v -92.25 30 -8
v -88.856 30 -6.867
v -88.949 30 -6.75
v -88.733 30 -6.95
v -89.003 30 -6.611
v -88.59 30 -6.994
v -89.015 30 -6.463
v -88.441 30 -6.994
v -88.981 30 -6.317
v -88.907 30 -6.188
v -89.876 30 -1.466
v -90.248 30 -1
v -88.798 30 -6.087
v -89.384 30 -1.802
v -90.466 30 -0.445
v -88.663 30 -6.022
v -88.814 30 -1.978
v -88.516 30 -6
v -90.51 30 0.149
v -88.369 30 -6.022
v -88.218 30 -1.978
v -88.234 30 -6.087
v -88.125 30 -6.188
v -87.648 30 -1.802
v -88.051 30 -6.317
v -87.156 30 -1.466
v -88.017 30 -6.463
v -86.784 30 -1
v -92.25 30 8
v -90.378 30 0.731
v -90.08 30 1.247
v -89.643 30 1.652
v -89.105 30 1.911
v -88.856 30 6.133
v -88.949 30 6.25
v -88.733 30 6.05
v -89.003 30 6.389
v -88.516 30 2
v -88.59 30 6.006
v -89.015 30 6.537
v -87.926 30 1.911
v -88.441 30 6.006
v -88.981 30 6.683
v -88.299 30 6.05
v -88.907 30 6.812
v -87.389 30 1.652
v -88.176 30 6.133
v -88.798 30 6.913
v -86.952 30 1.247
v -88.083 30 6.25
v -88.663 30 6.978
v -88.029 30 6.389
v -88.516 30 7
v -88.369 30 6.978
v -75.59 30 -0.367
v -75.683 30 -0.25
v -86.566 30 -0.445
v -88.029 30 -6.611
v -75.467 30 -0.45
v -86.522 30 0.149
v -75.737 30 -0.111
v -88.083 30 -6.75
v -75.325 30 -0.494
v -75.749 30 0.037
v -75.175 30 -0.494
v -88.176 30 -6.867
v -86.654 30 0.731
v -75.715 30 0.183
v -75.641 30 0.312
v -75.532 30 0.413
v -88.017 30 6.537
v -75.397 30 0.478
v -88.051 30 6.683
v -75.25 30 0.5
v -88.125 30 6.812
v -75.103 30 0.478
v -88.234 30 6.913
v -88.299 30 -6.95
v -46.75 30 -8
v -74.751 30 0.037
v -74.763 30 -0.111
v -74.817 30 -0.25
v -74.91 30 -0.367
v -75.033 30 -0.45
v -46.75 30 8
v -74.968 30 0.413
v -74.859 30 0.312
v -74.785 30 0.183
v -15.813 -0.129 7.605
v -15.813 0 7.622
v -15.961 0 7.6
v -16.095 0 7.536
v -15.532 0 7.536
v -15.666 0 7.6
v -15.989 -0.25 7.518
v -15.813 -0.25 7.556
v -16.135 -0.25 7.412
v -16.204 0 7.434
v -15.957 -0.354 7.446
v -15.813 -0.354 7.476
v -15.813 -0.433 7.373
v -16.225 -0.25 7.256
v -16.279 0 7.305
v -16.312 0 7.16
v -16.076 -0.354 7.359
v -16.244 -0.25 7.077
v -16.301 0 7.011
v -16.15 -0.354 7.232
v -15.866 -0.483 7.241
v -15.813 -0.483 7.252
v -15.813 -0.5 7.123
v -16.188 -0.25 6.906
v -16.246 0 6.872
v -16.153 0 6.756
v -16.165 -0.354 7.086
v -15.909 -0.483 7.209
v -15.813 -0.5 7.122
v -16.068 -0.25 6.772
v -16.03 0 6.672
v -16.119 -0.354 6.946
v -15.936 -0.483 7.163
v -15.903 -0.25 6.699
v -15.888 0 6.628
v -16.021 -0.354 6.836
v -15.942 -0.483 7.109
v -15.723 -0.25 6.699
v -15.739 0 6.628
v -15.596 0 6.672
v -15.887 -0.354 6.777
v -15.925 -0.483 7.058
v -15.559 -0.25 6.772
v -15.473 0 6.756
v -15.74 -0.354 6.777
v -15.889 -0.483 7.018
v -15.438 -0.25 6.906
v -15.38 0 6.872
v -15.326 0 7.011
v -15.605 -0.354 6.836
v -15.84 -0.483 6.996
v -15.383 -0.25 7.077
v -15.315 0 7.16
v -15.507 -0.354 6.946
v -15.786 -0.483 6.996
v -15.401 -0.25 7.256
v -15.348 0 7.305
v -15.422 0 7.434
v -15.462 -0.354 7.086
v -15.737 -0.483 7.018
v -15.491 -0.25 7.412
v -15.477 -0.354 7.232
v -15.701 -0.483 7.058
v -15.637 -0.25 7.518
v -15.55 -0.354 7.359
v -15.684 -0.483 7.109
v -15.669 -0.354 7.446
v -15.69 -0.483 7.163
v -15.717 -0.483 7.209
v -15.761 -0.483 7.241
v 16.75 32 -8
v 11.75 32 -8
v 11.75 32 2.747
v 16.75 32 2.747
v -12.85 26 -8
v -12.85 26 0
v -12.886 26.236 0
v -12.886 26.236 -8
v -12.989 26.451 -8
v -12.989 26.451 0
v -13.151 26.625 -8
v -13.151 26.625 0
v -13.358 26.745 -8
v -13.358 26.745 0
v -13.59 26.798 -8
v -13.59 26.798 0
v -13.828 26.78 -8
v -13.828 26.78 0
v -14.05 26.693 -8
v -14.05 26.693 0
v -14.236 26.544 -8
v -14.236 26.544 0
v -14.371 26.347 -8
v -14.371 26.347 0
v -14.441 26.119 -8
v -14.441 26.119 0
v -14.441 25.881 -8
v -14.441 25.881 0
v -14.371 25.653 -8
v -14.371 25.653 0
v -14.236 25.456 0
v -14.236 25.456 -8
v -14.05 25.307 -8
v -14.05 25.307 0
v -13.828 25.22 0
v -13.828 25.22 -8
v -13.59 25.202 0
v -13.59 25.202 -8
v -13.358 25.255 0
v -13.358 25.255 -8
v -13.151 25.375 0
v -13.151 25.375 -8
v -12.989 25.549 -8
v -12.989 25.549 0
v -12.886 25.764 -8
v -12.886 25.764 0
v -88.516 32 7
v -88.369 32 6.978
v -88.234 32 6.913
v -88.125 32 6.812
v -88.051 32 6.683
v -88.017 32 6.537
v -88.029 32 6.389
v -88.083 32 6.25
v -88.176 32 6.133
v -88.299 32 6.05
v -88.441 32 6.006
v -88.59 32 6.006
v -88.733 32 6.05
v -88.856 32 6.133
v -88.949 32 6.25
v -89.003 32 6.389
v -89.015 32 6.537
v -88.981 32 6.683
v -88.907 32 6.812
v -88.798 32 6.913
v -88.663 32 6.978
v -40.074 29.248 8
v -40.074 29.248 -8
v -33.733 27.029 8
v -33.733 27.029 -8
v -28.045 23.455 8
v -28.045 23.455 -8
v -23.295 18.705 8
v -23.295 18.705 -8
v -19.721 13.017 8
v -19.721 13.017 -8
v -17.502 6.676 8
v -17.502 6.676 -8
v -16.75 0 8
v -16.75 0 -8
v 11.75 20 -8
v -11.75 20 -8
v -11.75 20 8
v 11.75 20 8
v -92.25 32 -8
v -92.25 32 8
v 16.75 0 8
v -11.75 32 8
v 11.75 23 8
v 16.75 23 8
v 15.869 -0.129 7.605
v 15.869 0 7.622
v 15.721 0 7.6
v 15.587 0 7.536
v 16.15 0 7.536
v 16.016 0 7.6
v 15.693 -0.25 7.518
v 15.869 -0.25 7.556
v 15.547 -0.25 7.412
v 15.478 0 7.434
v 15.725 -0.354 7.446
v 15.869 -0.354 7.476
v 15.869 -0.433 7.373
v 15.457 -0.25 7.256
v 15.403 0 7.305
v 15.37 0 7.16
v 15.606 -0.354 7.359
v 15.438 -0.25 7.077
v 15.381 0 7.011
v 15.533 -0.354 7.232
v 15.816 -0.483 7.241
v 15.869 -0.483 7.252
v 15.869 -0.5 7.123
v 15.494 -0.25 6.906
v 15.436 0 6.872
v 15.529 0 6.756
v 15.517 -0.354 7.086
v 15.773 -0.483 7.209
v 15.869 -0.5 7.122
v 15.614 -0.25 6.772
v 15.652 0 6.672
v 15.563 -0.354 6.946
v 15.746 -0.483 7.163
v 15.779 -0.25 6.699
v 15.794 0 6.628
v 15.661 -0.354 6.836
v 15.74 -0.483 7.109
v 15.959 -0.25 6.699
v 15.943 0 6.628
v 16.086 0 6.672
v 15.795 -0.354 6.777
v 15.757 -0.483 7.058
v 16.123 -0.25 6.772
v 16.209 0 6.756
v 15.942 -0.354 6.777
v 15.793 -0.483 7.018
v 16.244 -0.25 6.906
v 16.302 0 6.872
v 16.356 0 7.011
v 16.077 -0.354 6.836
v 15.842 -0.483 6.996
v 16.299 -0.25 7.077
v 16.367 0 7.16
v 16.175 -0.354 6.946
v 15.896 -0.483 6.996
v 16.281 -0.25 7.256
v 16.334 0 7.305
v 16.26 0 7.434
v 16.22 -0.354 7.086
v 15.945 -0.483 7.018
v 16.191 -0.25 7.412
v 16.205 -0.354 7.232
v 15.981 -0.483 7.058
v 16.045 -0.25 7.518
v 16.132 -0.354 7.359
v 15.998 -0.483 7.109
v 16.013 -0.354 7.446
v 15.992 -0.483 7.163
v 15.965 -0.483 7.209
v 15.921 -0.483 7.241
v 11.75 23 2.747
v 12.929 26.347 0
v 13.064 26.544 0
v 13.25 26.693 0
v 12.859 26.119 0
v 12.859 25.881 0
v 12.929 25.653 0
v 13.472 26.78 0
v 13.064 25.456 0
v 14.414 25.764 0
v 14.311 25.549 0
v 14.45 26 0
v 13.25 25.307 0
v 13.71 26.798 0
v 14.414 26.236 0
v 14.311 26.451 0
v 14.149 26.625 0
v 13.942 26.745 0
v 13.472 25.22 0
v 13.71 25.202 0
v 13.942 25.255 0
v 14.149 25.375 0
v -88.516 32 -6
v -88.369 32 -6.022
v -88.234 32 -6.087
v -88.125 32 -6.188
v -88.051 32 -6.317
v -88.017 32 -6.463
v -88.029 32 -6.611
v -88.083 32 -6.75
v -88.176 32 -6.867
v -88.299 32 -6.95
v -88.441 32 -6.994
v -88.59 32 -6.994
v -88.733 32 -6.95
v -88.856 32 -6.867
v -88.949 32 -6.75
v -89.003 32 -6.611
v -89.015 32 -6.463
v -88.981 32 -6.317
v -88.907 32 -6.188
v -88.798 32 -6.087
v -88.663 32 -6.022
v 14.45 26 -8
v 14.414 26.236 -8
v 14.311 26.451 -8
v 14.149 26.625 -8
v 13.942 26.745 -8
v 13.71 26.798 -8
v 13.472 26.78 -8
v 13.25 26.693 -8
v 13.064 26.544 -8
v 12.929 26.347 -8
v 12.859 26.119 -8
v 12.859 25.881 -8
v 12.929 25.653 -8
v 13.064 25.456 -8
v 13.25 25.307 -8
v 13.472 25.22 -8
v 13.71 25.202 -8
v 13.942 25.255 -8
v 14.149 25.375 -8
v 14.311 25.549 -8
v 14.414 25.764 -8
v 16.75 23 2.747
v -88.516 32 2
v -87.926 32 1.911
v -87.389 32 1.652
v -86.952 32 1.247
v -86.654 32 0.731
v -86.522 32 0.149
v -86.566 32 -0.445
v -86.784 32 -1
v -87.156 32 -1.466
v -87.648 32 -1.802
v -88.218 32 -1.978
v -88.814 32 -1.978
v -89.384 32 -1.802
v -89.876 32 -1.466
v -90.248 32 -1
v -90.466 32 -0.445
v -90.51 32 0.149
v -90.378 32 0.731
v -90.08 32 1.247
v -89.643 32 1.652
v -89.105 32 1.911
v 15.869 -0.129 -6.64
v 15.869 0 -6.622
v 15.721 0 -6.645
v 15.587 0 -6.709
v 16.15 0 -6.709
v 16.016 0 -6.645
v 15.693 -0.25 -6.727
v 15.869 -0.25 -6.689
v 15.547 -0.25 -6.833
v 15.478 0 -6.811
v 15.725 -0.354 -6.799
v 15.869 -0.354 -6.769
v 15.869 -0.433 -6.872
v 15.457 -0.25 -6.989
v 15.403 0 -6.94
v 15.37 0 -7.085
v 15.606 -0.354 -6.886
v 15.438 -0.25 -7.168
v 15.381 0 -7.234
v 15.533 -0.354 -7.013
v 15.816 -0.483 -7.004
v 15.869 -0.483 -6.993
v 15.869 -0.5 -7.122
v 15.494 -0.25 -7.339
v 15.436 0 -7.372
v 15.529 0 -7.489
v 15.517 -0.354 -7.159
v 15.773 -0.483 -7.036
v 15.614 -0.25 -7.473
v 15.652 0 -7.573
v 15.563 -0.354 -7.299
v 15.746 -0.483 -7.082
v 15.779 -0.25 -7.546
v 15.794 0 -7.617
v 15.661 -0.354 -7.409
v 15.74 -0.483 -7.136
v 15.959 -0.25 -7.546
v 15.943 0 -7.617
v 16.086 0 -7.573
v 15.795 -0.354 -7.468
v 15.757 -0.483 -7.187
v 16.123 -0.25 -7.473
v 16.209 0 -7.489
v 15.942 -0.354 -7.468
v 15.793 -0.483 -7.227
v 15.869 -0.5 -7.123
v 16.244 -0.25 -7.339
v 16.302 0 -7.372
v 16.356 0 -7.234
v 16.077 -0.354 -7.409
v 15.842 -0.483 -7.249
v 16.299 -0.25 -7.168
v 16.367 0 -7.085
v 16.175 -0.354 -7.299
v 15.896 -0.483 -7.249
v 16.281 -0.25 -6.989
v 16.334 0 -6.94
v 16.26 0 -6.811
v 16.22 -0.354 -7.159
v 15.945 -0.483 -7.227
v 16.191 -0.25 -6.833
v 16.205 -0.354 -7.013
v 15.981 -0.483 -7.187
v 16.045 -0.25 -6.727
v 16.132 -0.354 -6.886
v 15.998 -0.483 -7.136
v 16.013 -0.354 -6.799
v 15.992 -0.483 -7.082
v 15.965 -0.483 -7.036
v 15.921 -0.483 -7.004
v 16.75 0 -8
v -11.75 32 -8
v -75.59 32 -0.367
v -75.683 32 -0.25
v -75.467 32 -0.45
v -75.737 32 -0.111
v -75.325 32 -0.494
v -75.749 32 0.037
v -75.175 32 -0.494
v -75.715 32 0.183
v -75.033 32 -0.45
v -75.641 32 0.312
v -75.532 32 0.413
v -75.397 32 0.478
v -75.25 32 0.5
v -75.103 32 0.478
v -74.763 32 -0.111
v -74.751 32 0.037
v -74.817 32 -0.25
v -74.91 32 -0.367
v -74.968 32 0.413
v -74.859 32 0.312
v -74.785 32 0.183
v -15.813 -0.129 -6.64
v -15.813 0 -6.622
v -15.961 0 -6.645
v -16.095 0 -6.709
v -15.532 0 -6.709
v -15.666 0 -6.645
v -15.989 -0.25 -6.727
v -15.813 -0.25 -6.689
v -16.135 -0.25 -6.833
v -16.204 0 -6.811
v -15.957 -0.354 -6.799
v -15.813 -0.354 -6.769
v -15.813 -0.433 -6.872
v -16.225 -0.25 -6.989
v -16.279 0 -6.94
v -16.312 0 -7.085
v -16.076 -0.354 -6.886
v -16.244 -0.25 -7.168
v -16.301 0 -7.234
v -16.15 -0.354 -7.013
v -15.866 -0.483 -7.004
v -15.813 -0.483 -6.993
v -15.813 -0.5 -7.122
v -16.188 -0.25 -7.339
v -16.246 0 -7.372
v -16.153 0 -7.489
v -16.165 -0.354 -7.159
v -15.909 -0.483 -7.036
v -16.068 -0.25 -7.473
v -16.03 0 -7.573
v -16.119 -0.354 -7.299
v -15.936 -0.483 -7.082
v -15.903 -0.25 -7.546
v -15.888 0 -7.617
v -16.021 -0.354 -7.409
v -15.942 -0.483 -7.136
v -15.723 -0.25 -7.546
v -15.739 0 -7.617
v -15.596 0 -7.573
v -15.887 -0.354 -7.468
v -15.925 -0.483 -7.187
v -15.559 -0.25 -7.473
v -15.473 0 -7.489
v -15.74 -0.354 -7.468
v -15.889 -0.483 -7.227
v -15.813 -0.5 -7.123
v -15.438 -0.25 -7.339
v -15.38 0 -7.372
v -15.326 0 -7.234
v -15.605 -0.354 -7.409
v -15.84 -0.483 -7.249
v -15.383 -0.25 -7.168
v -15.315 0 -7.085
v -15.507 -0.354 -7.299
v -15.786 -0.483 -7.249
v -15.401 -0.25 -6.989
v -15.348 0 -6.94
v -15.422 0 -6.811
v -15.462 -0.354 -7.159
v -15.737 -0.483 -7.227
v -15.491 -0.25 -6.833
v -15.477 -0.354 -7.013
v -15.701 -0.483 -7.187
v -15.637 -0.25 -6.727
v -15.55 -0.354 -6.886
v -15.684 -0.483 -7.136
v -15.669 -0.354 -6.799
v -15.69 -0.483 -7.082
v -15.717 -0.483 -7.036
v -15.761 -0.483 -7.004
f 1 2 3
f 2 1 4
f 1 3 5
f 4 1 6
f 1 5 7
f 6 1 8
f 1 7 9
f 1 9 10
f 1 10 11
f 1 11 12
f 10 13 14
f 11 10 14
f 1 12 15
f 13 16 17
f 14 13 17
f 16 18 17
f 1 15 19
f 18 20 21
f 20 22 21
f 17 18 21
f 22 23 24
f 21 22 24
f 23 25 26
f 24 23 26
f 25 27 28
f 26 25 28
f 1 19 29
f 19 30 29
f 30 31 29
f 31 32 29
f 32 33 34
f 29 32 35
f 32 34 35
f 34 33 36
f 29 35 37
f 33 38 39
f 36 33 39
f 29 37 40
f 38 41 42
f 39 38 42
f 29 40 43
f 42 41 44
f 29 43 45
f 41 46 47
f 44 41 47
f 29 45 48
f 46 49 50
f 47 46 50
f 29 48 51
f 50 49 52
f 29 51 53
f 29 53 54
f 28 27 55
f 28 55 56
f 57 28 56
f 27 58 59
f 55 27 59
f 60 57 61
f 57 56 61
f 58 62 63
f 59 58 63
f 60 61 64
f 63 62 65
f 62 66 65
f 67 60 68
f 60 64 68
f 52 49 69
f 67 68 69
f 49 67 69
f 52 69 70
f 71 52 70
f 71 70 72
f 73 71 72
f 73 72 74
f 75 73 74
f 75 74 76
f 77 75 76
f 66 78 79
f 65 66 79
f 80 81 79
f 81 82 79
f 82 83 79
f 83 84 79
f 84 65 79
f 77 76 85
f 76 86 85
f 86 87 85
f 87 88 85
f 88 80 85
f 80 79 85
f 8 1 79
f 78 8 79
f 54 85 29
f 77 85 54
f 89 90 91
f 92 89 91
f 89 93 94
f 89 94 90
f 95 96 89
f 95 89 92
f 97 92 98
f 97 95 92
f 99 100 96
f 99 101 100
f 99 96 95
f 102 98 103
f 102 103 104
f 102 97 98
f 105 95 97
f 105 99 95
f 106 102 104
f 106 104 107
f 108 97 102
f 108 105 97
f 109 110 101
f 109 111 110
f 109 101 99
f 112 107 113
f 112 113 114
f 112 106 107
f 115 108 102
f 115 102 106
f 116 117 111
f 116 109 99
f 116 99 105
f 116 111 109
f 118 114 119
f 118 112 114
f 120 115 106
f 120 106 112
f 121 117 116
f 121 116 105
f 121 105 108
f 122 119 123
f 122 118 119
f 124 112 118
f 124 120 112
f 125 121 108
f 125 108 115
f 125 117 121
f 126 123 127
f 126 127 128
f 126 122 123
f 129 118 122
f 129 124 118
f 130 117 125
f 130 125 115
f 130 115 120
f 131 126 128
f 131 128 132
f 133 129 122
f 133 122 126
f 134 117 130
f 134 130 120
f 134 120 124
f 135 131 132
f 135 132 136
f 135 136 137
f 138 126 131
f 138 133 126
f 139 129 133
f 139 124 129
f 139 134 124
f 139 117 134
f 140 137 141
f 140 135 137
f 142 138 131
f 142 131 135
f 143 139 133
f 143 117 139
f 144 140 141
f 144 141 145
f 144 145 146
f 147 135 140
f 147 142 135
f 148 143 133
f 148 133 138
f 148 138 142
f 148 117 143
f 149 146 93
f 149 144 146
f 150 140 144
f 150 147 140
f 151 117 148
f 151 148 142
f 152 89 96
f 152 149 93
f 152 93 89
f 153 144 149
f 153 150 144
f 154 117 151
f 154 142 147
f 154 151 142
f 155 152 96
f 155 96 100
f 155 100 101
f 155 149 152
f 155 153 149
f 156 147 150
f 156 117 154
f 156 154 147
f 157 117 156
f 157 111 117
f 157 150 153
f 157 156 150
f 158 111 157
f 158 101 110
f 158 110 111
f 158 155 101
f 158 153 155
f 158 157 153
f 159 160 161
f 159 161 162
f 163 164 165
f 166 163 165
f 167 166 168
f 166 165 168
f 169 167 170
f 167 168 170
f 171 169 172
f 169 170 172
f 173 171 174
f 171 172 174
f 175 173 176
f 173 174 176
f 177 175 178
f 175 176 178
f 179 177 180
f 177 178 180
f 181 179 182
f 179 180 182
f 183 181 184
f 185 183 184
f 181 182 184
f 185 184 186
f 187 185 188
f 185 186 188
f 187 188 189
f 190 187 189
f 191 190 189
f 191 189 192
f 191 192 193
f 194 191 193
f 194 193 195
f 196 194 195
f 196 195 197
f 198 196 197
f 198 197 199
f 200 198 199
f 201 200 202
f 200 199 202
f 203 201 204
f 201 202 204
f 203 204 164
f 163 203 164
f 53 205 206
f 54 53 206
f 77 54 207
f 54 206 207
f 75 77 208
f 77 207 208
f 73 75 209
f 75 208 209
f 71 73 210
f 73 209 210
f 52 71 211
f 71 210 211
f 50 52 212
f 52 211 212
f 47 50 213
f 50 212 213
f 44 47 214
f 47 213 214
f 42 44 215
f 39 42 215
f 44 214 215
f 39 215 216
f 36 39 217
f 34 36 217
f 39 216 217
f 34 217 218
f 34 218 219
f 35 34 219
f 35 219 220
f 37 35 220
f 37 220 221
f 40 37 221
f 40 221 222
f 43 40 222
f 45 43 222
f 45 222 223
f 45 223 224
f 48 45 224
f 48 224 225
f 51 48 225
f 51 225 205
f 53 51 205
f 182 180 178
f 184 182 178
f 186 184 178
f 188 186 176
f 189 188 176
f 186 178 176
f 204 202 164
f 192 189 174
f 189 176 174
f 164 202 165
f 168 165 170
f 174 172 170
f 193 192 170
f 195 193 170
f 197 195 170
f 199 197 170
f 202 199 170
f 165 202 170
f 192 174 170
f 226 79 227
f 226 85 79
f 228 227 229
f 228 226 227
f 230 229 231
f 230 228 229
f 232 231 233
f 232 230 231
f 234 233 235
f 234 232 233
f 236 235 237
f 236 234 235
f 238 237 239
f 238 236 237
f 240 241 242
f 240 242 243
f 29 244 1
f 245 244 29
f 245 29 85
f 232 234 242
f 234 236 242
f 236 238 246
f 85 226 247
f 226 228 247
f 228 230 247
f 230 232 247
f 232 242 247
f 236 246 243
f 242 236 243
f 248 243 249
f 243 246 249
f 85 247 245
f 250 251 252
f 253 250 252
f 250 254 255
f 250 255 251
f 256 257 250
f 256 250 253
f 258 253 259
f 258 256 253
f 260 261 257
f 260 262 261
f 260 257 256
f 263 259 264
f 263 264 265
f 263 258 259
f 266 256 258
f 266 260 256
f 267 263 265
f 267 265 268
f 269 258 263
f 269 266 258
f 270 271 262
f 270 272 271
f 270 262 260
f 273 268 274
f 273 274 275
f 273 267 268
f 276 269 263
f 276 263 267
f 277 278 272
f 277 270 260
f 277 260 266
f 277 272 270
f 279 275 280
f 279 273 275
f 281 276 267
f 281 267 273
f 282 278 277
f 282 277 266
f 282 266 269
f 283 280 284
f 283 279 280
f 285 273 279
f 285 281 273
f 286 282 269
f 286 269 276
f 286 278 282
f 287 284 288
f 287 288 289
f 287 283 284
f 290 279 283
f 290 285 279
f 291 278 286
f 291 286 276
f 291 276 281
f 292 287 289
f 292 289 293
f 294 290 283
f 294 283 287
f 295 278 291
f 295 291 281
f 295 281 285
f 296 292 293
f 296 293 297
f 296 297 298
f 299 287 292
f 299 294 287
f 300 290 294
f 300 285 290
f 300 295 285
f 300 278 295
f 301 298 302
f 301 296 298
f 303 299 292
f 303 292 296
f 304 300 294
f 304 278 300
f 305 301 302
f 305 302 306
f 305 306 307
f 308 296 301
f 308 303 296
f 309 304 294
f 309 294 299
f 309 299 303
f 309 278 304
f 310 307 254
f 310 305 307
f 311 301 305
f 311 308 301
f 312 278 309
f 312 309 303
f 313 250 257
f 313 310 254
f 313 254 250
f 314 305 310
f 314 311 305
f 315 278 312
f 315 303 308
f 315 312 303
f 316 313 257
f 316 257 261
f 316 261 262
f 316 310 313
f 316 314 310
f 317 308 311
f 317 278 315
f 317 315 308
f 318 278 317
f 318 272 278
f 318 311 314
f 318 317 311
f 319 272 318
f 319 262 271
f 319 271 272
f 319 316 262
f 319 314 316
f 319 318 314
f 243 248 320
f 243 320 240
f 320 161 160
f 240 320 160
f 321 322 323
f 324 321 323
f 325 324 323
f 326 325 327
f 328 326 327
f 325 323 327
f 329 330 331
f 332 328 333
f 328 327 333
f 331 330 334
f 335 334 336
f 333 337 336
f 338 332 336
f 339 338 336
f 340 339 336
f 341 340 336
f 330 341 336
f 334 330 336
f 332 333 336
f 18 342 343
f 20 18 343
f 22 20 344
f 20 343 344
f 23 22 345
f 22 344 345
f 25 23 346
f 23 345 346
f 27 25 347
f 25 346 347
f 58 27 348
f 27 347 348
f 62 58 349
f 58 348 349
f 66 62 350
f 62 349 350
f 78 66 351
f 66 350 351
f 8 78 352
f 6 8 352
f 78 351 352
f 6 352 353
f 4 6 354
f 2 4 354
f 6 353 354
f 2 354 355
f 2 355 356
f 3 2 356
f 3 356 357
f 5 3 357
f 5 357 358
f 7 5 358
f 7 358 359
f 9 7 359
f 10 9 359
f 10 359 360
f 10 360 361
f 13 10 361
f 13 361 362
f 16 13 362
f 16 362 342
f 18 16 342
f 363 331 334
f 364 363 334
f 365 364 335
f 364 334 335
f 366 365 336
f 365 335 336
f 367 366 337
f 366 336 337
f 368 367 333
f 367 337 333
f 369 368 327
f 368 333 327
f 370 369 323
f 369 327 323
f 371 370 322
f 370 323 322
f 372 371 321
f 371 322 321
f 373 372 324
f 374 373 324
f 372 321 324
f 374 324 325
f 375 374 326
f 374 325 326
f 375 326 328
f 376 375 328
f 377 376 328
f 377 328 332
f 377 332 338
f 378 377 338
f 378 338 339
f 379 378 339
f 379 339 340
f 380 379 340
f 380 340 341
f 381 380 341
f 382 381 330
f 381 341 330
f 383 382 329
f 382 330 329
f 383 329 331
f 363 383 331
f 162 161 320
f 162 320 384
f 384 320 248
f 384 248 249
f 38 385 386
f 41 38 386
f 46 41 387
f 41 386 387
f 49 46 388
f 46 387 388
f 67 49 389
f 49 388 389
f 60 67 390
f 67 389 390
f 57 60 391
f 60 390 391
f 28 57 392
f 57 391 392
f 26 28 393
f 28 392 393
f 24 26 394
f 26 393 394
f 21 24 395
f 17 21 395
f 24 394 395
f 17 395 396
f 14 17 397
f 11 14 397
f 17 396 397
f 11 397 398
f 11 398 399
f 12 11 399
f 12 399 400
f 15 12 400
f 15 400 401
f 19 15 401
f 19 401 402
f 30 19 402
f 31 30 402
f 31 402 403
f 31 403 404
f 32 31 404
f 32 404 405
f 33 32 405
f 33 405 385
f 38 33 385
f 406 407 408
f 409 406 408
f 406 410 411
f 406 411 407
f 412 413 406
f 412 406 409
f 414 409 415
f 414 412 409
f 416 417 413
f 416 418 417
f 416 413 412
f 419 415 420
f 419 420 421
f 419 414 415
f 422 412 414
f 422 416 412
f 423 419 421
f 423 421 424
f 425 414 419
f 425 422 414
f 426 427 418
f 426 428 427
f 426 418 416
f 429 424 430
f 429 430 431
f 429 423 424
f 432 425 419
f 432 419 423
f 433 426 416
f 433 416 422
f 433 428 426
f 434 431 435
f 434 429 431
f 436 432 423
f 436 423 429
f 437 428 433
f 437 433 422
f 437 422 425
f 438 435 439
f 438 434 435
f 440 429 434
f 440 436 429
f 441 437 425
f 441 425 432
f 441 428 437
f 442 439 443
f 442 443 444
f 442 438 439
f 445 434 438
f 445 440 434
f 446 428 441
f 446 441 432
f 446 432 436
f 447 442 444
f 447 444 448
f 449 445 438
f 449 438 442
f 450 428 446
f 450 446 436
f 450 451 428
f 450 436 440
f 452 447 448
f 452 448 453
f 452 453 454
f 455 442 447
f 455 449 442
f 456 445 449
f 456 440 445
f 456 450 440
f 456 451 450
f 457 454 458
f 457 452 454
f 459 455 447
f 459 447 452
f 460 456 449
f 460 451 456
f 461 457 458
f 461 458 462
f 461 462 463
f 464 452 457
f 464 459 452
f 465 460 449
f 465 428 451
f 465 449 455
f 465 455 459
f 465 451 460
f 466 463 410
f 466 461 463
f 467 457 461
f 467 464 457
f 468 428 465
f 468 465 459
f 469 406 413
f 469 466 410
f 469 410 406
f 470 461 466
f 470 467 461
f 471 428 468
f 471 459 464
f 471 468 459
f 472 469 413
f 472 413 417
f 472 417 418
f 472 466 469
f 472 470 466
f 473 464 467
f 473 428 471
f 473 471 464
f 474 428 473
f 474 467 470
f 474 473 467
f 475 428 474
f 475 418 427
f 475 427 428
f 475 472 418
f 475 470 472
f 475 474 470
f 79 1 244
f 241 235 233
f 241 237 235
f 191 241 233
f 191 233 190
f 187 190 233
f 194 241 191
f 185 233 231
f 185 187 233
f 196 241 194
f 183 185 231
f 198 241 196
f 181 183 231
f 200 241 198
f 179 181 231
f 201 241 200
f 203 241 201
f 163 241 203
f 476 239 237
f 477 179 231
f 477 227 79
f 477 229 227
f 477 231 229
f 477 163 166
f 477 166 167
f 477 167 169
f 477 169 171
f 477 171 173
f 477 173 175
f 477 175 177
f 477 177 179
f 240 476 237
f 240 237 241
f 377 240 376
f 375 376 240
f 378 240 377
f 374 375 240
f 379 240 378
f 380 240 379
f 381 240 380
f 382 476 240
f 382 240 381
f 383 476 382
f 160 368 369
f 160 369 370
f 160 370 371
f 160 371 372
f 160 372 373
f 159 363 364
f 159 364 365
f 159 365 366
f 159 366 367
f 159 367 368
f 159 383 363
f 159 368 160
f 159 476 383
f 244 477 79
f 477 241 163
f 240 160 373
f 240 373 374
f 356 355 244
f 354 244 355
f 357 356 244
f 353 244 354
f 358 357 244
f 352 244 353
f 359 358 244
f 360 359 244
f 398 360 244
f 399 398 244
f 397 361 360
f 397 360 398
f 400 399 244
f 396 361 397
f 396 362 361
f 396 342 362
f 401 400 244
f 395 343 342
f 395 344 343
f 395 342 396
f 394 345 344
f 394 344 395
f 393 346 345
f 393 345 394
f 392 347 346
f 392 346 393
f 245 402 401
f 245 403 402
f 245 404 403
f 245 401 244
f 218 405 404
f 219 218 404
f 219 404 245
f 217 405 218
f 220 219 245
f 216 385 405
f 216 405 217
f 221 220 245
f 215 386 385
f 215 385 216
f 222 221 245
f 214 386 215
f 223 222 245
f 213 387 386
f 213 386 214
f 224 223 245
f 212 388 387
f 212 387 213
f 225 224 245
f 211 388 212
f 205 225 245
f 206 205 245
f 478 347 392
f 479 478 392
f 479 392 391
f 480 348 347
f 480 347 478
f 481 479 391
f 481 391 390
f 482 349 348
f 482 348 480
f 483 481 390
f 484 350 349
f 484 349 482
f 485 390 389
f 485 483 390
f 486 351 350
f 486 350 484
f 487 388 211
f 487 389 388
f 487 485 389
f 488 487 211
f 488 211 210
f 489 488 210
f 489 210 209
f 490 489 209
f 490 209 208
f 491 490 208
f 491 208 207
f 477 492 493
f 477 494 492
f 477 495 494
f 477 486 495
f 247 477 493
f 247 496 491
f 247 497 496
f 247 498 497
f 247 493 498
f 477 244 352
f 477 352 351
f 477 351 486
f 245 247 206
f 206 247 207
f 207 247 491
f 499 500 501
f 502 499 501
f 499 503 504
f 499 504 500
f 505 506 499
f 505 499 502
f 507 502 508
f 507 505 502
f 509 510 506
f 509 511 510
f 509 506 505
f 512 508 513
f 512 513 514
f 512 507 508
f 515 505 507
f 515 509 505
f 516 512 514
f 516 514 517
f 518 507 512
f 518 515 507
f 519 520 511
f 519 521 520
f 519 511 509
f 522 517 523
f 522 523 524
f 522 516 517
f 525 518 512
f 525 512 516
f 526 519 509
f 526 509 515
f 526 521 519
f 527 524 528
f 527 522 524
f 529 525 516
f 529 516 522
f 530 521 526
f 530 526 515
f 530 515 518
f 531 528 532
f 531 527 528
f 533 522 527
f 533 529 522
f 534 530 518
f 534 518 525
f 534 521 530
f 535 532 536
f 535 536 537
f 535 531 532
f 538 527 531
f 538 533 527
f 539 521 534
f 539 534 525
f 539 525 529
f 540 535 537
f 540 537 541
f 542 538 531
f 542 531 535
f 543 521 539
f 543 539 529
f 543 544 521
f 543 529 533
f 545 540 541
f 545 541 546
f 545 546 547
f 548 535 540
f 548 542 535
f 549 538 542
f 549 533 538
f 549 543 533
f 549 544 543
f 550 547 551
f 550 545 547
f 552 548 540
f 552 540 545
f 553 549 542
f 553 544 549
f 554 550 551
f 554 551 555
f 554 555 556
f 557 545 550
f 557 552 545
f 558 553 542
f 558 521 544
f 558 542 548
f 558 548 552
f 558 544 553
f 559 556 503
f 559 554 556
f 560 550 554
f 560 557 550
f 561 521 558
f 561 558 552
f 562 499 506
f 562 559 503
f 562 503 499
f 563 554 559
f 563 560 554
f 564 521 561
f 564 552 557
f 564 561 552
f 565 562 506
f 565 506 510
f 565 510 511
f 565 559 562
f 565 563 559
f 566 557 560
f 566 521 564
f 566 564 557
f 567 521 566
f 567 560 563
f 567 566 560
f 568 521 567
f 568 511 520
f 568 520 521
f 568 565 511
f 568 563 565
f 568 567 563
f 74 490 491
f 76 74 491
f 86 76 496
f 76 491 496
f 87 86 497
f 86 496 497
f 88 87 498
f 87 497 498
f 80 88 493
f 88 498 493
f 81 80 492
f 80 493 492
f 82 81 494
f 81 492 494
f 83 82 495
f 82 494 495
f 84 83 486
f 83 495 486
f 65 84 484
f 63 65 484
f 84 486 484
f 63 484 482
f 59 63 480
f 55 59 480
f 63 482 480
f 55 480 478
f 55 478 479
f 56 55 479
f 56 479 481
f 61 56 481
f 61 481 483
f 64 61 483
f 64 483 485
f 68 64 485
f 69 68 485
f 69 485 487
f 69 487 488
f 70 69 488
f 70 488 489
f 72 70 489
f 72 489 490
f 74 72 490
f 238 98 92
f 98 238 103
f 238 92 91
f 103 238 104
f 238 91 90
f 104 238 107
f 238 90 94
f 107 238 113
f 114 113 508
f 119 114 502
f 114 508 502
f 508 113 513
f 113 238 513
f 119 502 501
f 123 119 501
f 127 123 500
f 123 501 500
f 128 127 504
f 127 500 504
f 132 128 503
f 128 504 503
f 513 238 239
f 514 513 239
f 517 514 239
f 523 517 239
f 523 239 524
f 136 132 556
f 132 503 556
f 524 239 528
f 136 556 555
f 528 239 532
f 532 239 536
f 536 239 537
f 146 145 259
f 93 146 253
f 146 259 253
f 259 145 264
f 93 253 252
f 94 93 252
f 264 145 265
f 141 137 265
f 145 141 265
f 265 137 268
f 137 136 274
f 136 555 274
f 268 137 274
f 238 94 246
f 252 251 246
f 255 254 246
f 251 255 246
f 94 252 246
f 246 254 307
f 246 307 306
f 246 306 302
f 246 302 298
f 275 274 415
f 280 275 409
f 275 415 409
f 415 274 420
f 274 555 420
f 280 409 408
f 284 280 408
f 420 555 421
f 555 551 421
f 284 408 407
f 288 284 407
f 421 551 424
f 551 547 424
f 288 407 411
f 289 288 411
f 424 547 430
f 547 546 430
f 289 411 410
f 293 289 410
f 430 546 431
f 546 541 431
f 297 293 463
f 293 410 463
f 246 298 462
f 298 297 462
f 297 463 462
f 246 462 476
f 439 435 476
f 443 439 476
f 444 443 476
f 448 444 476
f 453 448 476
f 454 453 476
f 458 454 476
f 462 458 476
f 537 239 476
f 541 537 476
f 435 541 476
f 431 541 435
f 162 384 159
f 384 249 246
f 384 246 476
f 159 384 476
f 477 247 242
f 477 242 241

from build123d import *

# Parameters (mm, degrees)
SKETCH1_W           = 33.5
SKETCH1_H           = 16
BOSS_EXTRUDE1_DEPTH = 32
SKETCH2_W           = 23.5
SKETCH2_H           = 16
CUT_EXTRUDE1_DEPTH  = 12
SKETCH4_R           = 0.5
BOSS_EXTRUDE2_DEPTH = 0.5
FILLET1_R           = 0.5
SKETCH6_W           = 16
SKETCH6_H           = 2
BOSS_EXTRUDE3_DEPTH = 75.5
SKETCH7_W           = 5
SKETCH7_H           = 5.252635659
CUT_EXTRUDE2_DEPTH  = 9
SKETCH8_R           = 0.8
CUT_EXTRUDE3_DEPTH  = 8
SKETCH9_R           = 0.5
SKETCH9_R_2         = 2
CUT_EXTRUDE4_DEPTH  = 8
FILLET2_R           = 30


with BuildPart() as part:
    # Sketch1 → Boss-Extrude1 (new body)
    with BuildSketch(Plane(origin=(0, 0, 0), x_dir=(1, 0, 0), z_dir=(0, 1, 0))):
        Rectangle(SKETCH1_W, SKETCH1_H)
    extrude(amount=BOSS_EXTRUDE1_DEPTH)

    # Sketch2 → Cut-Extrude1 (cut)
    with BuildSketch(Plane(origin=(0, 32, 0), x_dir=(1, 0, 0), z_dir=(0, 1, 0))):
        Rectangle(SKETCH2_W, SKETCH2_H)
    extrude(amount=-CUT_EXTRUDE1_DEPTH, mode=Mode.SUBTRACT)

    # Sketch4 → Boss-Extrude2 (add)
    with BuildSketch(Plane(origin=(0, 0, 0), x_dir=(-1, 0, 0), z_dir=(0, -1, 0))):
        with Locations(Location((15.81324072, -7.12248893, 0), (0, 0, 270))):
            Circle(SKETCH4_R)
        with Locations(Location((-15.868829232, -7.12248893, 0), (0, 0, 270))):
            Circle(SKETCH4_R)
        with Locations(Location((-15.868829232, 7.12248893, 0), (0, 0, 270))):
            Circle(SKETCH4_R)
        with Locations(Location((15.81324072, 7.12248893, 0), (0, 0, 270))):
            Circle(SKETCH4_R)
    extrude(amount=BOSS_EXTRUDE2_DEPTH)

    # Fillet1
    fillet1_edges = [part.edges().sort_by_distance(p)[0] for p in [
        (-15.81324072, -0.5, 6.62248893),
        (15.868829232, -0.5, 6.62248893),
        (15.868829232, -0.5, -7.62248893),
        (-15.81324072, -0.5, -7.62248893),
    ]]
    fillet(fillet1_edges, radius=FILLET1_R - 0.0001)  # a hair under: the kernel refuses the full size

    # Sketch6 → Boss-Extrude3 (add)
    with BuildSketch(Plane.ZY.offset(16.75)):
        with Locations((0, 31)):
            Rectangle(SKETCH6_W, SKETCH6_H)
    extrude(amount=BOSS_EXTRUDE3_DEPTH)

    # Sketch7 → Cut-Extrude2 (cut)
    with BuildSketch(Plane(origin=(0, 32, 0), x_dir=(1, 0, 0), z_dir=(0, 1, 0))):
        with Locations((14.25, -5.373682171)):
            Rectangle(SKETCH7_W, SKETCH7_H)
    extrude(amount=-CUT_EXTRUDE2_DEPTH, mode=Mode.SUBTRACT)

    # Sketch8 → Cut-Extrude3 (cut)
    with BuildSketch(Plane.XY):
        with Locations((13.65, 26)):
            Circle(SKETCH8_R)
        with Locations((-13.65, 26)):
            Circle(SKETCH8_R)
    extrude(amount=-CUT_EXTRUDE3_DEPTH, mode=Mode.SUBTRACT)

    # Sketch9 → Cut-Extrude4 (cut)
    with BuildSketch(Plane(origin=(0, 32, 0), x_dir=(1, 0, 0), z_dir=(0, 1, 0))):
        with Locations(Location((-88.515974664, 6.5, 0), (0, 0, 270))):
            Circle(SKETCH9_R)
        with Locations(Location((-75.25, 0, 0), (0, 0, 270))):
            Circle(SKETCH9_R)
        with Locations(Location((-88.515974664, -6.5, 0), (0, 0, 270))):
            Circle(SKETCH9_R)
        with Locations(Location((-88.515974664, 0, 0), (0, 0, 270))):
            Circle(SKETCH9_R_2)
    extrude(amount=-CUT_EXTRUDE4_DEPTH, mode=Mode.SUBTRACT)

    # Fillet2
    fillet2_edges = [part.edges().sort_by_distance(p)[0] for p in [
        (-16.75, 30, 0),
    ]]
    fillet(fillet2_edges, radius=FILLET2_R - 0.0001)  # a hair under: the kernel refuses the full size


solid = part.part
